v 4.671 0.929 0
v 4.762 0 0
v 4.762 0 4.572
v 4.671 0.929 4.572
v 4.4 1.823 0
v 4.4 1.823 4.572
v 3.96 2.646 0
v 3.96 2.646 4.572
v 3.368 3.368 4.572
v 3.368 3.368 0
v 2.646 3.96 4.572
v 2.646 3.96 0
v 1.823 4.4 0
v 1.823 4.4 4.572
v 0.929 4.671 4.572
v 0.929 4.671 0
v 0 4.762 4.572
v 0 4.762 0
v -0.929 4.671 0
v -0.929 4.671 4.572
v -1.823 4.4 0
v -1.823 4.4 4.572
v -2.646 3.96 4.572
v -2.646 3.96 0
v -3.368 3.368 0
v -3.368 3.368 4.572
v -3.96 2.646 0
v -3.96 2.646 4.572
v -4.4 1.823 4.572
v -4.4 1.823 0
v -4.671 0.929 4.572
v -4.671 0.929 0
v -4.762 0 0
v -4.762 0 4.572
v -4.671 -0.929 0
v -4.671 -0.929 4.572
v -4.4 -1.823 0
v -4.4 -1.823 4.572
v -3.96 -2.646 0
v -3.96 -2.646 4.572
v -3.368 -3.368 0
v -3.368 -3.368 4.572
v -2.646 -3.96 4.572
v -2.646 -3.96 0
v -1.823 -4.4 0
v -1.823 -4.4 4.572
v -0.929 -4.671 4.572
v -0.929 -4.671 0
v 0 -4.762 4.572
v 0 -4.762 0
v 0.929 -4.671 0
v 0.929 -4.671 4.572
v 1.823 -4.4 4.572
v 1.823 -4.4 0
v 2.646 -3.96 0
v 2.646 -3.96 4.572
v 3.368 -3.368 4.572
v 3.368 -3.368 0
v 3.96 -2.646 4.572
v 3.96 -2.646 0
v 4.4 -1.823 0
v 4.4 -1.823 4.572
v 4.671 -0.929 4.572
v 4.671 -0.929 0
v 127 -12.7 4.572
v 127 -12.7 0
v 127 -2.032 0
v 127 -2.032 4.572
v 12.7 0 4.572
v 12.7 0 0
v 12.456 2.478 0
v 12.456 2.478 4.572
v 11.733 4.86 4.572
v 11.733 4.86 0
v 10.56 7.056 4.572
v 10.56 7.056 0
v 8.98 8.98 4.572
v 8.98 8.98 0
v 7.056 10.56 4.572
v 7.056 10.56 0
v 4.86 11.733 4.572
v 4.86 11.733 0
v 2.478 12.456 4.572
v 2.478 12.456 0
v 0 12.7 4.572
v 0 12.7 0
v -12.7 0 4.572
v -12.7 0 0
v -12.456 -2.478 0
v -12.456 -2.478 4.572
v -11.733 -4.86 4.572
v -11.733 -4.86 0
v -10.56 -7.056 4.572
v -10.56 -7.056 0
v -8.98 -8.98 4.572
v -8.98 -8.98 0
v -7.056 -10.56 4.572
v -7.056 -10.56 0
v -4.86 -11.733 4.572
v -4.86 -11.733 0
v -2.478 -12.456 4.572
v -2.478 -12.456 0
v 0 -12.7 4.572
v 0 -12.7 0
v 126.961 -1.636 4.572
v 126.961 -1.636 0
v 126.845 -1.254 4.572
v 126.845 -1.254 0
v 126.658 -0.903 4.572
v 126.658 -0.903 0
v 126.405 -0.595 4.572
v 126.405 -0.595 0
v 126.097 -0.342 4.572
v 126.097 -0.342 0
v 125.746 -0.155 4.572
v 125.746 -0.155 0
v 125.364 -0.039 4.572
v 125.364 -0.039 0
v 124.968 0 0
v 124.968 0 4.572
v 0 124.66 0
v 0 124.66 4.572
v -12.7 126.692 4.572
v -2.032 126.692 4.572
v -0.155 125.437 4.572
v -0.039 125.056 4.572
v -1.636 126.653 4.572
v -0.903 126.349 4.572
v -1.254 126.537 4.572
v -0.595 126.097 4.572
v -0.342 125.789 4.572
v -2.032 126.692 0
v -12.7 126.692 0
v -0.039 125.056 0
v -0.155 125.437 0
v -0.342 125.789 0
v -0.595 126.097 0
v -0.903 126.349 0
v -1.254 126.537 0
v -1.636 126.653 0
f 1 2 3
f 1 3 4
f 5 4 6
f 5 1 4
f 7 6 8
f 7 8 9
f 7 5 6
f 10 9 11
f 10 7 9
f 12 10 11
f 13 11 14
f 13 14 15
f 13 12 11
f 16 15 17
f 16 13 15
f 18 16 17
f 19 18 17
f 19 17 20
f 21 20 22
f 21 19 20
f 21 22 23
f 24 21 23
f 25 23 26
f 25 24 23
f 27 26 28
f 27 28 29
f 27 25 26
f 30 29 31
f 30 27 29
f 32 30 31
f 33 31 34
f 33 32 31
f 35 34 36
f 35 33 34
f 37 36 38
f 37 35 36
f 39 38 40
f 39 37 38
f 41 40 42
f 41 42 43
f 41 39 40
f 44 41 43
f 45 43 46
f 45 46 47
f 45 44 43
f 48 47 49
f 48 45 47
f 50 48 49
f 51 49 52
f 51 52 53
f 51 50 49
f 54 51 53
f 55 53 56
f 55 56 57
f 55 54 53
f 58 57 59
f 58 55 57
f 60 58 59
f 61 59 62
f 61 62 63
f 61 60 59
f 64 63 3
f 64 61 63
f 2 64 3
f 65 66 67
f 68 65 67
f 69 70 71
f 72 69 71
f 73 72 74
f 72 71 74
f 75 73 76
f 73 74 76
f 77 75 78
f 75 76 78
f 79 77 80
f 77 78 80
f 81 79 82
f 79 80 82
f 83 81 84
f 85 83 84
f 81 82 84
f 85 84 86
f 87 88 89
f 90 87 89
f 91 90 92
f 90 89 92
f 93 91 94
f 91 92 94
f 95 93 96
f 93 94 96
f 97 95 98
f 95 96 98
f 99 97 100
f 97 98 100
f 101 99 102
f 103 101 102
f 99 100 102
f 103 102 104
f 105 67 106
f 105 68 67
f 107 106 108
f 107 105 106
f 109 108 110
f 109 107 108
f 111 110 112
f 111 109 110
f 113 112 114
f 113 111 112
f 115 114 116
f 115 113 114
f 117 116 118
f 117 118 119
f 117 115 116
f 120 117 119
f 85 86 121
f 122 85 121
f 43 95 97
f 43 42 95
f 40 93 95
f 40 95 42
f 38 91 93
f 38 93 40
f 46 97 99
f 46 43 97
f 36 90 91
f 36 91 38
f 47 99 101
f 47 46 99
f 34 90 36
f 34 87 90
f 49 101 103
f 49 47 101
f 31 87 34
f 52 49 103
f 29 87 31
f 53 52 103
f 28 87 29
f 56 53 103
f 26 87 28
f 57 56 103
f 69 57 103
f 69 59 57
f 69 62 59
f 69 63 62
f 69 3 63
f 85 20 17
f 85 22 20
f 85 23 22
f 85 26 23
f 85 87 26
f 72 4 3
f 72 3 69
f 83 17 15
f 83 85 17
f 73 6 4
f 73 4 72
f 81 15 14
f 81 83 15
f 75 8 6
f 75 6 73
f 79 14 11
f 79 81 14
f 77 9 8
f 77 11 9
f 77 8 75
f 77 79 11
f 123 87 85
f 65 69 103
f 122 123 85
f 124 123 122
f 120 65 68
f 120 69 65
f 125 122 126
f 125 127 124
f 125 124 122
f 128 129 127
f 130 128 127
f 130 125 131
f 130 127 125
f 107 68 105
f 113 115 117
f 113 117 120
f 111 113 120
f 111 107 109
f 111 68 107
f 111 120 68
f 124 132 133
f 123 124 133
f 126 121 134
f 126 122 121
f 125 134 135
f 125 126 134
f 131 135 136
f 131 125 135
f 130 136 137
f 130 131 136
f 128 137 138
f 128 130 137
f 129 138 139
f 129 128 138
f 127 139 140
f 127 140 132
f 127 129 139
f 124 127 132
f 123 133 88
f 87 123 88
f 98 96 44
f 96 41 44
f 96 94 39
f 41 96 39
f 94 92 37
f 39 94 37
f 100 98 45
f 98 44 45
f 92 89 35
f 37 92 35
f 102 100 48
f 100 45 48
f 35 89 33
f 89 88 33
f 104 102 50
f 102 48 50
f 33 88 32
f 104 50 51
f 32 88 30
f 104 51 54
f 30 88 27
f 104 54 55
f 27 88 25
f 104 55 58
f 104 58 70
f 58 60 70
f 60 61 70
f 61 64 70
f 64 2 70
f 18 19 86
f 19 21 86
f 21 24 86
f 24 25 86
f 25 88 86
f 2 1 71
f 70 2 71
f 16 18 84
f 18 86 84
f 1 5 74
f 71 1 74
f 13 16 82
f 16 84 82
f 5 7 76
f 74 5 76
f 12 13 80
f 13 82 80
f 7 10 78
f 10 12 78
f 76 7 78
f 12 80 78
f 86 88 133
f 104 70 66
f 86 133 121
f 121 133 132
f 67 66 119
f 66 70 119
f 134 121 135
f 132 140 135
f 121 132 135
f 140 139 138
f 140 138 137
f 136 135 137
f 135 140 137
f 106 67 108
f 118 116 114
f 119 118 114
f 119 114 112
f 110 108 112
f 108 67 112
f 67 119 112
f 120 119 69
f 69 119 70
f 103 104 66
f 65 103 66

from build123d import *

# Parameters (mm, degrees)
F0_R     = 4.7625
F1_DEPTH = 4.572
F2_R     = 2.032


with BuildPart() as f1:
    # F0 (on Top) → F1 (new body)
    with BuildSketch(Plane.XY):
        with BuildLine():
            ThreePointArc((0, -12.7), (8.980256, -8.980256), (12.7, 0))
            ThreePointArc((12.7, 0), (8.980256, 8.980256), (0, 12.7))
            ThreePointArc((0, 12.7), (-8.980256, 8.980256), (-12.7, 0))
            ThreePointArc((-12.7, 0), (-8.980256, -8.980256), (0, -12.7))
        make_face()
        Circle(F0_R, mode=Mode.SUBTRACT)
        with BuildLine():
            Line((127, 0), (12.7, 0))
            ThreePointArc((12.7, 0), (8.980256, -8.980256), (0, -12.7))
            Line((0, -12.7), (127, -12.7))
            Line((127, -12.7), (127, 0))
        make_face()
        with BuildLine():
            ThreePointArc((-12.7, 0), (-8.980256, 8.980256), (0, 12.7))
            Line((0, 12.7), (0, 126.691781))
            Line((0, 126.691781), (-12.7, 126.691781))
            Line((-12.7, 126.691781), (-12.7, 0))
        make_face()
    extrude(amount=F1_DEPTH)

    # F2
    f2_edges = [f1.edges().sort_by_distance(p)[0] for p in [
        (0, 126.691781, 2.286),
        (127, 0, 2.286),
    ]]
    fillet(f2_edges, radius=F2_R)


solid = f1.part
